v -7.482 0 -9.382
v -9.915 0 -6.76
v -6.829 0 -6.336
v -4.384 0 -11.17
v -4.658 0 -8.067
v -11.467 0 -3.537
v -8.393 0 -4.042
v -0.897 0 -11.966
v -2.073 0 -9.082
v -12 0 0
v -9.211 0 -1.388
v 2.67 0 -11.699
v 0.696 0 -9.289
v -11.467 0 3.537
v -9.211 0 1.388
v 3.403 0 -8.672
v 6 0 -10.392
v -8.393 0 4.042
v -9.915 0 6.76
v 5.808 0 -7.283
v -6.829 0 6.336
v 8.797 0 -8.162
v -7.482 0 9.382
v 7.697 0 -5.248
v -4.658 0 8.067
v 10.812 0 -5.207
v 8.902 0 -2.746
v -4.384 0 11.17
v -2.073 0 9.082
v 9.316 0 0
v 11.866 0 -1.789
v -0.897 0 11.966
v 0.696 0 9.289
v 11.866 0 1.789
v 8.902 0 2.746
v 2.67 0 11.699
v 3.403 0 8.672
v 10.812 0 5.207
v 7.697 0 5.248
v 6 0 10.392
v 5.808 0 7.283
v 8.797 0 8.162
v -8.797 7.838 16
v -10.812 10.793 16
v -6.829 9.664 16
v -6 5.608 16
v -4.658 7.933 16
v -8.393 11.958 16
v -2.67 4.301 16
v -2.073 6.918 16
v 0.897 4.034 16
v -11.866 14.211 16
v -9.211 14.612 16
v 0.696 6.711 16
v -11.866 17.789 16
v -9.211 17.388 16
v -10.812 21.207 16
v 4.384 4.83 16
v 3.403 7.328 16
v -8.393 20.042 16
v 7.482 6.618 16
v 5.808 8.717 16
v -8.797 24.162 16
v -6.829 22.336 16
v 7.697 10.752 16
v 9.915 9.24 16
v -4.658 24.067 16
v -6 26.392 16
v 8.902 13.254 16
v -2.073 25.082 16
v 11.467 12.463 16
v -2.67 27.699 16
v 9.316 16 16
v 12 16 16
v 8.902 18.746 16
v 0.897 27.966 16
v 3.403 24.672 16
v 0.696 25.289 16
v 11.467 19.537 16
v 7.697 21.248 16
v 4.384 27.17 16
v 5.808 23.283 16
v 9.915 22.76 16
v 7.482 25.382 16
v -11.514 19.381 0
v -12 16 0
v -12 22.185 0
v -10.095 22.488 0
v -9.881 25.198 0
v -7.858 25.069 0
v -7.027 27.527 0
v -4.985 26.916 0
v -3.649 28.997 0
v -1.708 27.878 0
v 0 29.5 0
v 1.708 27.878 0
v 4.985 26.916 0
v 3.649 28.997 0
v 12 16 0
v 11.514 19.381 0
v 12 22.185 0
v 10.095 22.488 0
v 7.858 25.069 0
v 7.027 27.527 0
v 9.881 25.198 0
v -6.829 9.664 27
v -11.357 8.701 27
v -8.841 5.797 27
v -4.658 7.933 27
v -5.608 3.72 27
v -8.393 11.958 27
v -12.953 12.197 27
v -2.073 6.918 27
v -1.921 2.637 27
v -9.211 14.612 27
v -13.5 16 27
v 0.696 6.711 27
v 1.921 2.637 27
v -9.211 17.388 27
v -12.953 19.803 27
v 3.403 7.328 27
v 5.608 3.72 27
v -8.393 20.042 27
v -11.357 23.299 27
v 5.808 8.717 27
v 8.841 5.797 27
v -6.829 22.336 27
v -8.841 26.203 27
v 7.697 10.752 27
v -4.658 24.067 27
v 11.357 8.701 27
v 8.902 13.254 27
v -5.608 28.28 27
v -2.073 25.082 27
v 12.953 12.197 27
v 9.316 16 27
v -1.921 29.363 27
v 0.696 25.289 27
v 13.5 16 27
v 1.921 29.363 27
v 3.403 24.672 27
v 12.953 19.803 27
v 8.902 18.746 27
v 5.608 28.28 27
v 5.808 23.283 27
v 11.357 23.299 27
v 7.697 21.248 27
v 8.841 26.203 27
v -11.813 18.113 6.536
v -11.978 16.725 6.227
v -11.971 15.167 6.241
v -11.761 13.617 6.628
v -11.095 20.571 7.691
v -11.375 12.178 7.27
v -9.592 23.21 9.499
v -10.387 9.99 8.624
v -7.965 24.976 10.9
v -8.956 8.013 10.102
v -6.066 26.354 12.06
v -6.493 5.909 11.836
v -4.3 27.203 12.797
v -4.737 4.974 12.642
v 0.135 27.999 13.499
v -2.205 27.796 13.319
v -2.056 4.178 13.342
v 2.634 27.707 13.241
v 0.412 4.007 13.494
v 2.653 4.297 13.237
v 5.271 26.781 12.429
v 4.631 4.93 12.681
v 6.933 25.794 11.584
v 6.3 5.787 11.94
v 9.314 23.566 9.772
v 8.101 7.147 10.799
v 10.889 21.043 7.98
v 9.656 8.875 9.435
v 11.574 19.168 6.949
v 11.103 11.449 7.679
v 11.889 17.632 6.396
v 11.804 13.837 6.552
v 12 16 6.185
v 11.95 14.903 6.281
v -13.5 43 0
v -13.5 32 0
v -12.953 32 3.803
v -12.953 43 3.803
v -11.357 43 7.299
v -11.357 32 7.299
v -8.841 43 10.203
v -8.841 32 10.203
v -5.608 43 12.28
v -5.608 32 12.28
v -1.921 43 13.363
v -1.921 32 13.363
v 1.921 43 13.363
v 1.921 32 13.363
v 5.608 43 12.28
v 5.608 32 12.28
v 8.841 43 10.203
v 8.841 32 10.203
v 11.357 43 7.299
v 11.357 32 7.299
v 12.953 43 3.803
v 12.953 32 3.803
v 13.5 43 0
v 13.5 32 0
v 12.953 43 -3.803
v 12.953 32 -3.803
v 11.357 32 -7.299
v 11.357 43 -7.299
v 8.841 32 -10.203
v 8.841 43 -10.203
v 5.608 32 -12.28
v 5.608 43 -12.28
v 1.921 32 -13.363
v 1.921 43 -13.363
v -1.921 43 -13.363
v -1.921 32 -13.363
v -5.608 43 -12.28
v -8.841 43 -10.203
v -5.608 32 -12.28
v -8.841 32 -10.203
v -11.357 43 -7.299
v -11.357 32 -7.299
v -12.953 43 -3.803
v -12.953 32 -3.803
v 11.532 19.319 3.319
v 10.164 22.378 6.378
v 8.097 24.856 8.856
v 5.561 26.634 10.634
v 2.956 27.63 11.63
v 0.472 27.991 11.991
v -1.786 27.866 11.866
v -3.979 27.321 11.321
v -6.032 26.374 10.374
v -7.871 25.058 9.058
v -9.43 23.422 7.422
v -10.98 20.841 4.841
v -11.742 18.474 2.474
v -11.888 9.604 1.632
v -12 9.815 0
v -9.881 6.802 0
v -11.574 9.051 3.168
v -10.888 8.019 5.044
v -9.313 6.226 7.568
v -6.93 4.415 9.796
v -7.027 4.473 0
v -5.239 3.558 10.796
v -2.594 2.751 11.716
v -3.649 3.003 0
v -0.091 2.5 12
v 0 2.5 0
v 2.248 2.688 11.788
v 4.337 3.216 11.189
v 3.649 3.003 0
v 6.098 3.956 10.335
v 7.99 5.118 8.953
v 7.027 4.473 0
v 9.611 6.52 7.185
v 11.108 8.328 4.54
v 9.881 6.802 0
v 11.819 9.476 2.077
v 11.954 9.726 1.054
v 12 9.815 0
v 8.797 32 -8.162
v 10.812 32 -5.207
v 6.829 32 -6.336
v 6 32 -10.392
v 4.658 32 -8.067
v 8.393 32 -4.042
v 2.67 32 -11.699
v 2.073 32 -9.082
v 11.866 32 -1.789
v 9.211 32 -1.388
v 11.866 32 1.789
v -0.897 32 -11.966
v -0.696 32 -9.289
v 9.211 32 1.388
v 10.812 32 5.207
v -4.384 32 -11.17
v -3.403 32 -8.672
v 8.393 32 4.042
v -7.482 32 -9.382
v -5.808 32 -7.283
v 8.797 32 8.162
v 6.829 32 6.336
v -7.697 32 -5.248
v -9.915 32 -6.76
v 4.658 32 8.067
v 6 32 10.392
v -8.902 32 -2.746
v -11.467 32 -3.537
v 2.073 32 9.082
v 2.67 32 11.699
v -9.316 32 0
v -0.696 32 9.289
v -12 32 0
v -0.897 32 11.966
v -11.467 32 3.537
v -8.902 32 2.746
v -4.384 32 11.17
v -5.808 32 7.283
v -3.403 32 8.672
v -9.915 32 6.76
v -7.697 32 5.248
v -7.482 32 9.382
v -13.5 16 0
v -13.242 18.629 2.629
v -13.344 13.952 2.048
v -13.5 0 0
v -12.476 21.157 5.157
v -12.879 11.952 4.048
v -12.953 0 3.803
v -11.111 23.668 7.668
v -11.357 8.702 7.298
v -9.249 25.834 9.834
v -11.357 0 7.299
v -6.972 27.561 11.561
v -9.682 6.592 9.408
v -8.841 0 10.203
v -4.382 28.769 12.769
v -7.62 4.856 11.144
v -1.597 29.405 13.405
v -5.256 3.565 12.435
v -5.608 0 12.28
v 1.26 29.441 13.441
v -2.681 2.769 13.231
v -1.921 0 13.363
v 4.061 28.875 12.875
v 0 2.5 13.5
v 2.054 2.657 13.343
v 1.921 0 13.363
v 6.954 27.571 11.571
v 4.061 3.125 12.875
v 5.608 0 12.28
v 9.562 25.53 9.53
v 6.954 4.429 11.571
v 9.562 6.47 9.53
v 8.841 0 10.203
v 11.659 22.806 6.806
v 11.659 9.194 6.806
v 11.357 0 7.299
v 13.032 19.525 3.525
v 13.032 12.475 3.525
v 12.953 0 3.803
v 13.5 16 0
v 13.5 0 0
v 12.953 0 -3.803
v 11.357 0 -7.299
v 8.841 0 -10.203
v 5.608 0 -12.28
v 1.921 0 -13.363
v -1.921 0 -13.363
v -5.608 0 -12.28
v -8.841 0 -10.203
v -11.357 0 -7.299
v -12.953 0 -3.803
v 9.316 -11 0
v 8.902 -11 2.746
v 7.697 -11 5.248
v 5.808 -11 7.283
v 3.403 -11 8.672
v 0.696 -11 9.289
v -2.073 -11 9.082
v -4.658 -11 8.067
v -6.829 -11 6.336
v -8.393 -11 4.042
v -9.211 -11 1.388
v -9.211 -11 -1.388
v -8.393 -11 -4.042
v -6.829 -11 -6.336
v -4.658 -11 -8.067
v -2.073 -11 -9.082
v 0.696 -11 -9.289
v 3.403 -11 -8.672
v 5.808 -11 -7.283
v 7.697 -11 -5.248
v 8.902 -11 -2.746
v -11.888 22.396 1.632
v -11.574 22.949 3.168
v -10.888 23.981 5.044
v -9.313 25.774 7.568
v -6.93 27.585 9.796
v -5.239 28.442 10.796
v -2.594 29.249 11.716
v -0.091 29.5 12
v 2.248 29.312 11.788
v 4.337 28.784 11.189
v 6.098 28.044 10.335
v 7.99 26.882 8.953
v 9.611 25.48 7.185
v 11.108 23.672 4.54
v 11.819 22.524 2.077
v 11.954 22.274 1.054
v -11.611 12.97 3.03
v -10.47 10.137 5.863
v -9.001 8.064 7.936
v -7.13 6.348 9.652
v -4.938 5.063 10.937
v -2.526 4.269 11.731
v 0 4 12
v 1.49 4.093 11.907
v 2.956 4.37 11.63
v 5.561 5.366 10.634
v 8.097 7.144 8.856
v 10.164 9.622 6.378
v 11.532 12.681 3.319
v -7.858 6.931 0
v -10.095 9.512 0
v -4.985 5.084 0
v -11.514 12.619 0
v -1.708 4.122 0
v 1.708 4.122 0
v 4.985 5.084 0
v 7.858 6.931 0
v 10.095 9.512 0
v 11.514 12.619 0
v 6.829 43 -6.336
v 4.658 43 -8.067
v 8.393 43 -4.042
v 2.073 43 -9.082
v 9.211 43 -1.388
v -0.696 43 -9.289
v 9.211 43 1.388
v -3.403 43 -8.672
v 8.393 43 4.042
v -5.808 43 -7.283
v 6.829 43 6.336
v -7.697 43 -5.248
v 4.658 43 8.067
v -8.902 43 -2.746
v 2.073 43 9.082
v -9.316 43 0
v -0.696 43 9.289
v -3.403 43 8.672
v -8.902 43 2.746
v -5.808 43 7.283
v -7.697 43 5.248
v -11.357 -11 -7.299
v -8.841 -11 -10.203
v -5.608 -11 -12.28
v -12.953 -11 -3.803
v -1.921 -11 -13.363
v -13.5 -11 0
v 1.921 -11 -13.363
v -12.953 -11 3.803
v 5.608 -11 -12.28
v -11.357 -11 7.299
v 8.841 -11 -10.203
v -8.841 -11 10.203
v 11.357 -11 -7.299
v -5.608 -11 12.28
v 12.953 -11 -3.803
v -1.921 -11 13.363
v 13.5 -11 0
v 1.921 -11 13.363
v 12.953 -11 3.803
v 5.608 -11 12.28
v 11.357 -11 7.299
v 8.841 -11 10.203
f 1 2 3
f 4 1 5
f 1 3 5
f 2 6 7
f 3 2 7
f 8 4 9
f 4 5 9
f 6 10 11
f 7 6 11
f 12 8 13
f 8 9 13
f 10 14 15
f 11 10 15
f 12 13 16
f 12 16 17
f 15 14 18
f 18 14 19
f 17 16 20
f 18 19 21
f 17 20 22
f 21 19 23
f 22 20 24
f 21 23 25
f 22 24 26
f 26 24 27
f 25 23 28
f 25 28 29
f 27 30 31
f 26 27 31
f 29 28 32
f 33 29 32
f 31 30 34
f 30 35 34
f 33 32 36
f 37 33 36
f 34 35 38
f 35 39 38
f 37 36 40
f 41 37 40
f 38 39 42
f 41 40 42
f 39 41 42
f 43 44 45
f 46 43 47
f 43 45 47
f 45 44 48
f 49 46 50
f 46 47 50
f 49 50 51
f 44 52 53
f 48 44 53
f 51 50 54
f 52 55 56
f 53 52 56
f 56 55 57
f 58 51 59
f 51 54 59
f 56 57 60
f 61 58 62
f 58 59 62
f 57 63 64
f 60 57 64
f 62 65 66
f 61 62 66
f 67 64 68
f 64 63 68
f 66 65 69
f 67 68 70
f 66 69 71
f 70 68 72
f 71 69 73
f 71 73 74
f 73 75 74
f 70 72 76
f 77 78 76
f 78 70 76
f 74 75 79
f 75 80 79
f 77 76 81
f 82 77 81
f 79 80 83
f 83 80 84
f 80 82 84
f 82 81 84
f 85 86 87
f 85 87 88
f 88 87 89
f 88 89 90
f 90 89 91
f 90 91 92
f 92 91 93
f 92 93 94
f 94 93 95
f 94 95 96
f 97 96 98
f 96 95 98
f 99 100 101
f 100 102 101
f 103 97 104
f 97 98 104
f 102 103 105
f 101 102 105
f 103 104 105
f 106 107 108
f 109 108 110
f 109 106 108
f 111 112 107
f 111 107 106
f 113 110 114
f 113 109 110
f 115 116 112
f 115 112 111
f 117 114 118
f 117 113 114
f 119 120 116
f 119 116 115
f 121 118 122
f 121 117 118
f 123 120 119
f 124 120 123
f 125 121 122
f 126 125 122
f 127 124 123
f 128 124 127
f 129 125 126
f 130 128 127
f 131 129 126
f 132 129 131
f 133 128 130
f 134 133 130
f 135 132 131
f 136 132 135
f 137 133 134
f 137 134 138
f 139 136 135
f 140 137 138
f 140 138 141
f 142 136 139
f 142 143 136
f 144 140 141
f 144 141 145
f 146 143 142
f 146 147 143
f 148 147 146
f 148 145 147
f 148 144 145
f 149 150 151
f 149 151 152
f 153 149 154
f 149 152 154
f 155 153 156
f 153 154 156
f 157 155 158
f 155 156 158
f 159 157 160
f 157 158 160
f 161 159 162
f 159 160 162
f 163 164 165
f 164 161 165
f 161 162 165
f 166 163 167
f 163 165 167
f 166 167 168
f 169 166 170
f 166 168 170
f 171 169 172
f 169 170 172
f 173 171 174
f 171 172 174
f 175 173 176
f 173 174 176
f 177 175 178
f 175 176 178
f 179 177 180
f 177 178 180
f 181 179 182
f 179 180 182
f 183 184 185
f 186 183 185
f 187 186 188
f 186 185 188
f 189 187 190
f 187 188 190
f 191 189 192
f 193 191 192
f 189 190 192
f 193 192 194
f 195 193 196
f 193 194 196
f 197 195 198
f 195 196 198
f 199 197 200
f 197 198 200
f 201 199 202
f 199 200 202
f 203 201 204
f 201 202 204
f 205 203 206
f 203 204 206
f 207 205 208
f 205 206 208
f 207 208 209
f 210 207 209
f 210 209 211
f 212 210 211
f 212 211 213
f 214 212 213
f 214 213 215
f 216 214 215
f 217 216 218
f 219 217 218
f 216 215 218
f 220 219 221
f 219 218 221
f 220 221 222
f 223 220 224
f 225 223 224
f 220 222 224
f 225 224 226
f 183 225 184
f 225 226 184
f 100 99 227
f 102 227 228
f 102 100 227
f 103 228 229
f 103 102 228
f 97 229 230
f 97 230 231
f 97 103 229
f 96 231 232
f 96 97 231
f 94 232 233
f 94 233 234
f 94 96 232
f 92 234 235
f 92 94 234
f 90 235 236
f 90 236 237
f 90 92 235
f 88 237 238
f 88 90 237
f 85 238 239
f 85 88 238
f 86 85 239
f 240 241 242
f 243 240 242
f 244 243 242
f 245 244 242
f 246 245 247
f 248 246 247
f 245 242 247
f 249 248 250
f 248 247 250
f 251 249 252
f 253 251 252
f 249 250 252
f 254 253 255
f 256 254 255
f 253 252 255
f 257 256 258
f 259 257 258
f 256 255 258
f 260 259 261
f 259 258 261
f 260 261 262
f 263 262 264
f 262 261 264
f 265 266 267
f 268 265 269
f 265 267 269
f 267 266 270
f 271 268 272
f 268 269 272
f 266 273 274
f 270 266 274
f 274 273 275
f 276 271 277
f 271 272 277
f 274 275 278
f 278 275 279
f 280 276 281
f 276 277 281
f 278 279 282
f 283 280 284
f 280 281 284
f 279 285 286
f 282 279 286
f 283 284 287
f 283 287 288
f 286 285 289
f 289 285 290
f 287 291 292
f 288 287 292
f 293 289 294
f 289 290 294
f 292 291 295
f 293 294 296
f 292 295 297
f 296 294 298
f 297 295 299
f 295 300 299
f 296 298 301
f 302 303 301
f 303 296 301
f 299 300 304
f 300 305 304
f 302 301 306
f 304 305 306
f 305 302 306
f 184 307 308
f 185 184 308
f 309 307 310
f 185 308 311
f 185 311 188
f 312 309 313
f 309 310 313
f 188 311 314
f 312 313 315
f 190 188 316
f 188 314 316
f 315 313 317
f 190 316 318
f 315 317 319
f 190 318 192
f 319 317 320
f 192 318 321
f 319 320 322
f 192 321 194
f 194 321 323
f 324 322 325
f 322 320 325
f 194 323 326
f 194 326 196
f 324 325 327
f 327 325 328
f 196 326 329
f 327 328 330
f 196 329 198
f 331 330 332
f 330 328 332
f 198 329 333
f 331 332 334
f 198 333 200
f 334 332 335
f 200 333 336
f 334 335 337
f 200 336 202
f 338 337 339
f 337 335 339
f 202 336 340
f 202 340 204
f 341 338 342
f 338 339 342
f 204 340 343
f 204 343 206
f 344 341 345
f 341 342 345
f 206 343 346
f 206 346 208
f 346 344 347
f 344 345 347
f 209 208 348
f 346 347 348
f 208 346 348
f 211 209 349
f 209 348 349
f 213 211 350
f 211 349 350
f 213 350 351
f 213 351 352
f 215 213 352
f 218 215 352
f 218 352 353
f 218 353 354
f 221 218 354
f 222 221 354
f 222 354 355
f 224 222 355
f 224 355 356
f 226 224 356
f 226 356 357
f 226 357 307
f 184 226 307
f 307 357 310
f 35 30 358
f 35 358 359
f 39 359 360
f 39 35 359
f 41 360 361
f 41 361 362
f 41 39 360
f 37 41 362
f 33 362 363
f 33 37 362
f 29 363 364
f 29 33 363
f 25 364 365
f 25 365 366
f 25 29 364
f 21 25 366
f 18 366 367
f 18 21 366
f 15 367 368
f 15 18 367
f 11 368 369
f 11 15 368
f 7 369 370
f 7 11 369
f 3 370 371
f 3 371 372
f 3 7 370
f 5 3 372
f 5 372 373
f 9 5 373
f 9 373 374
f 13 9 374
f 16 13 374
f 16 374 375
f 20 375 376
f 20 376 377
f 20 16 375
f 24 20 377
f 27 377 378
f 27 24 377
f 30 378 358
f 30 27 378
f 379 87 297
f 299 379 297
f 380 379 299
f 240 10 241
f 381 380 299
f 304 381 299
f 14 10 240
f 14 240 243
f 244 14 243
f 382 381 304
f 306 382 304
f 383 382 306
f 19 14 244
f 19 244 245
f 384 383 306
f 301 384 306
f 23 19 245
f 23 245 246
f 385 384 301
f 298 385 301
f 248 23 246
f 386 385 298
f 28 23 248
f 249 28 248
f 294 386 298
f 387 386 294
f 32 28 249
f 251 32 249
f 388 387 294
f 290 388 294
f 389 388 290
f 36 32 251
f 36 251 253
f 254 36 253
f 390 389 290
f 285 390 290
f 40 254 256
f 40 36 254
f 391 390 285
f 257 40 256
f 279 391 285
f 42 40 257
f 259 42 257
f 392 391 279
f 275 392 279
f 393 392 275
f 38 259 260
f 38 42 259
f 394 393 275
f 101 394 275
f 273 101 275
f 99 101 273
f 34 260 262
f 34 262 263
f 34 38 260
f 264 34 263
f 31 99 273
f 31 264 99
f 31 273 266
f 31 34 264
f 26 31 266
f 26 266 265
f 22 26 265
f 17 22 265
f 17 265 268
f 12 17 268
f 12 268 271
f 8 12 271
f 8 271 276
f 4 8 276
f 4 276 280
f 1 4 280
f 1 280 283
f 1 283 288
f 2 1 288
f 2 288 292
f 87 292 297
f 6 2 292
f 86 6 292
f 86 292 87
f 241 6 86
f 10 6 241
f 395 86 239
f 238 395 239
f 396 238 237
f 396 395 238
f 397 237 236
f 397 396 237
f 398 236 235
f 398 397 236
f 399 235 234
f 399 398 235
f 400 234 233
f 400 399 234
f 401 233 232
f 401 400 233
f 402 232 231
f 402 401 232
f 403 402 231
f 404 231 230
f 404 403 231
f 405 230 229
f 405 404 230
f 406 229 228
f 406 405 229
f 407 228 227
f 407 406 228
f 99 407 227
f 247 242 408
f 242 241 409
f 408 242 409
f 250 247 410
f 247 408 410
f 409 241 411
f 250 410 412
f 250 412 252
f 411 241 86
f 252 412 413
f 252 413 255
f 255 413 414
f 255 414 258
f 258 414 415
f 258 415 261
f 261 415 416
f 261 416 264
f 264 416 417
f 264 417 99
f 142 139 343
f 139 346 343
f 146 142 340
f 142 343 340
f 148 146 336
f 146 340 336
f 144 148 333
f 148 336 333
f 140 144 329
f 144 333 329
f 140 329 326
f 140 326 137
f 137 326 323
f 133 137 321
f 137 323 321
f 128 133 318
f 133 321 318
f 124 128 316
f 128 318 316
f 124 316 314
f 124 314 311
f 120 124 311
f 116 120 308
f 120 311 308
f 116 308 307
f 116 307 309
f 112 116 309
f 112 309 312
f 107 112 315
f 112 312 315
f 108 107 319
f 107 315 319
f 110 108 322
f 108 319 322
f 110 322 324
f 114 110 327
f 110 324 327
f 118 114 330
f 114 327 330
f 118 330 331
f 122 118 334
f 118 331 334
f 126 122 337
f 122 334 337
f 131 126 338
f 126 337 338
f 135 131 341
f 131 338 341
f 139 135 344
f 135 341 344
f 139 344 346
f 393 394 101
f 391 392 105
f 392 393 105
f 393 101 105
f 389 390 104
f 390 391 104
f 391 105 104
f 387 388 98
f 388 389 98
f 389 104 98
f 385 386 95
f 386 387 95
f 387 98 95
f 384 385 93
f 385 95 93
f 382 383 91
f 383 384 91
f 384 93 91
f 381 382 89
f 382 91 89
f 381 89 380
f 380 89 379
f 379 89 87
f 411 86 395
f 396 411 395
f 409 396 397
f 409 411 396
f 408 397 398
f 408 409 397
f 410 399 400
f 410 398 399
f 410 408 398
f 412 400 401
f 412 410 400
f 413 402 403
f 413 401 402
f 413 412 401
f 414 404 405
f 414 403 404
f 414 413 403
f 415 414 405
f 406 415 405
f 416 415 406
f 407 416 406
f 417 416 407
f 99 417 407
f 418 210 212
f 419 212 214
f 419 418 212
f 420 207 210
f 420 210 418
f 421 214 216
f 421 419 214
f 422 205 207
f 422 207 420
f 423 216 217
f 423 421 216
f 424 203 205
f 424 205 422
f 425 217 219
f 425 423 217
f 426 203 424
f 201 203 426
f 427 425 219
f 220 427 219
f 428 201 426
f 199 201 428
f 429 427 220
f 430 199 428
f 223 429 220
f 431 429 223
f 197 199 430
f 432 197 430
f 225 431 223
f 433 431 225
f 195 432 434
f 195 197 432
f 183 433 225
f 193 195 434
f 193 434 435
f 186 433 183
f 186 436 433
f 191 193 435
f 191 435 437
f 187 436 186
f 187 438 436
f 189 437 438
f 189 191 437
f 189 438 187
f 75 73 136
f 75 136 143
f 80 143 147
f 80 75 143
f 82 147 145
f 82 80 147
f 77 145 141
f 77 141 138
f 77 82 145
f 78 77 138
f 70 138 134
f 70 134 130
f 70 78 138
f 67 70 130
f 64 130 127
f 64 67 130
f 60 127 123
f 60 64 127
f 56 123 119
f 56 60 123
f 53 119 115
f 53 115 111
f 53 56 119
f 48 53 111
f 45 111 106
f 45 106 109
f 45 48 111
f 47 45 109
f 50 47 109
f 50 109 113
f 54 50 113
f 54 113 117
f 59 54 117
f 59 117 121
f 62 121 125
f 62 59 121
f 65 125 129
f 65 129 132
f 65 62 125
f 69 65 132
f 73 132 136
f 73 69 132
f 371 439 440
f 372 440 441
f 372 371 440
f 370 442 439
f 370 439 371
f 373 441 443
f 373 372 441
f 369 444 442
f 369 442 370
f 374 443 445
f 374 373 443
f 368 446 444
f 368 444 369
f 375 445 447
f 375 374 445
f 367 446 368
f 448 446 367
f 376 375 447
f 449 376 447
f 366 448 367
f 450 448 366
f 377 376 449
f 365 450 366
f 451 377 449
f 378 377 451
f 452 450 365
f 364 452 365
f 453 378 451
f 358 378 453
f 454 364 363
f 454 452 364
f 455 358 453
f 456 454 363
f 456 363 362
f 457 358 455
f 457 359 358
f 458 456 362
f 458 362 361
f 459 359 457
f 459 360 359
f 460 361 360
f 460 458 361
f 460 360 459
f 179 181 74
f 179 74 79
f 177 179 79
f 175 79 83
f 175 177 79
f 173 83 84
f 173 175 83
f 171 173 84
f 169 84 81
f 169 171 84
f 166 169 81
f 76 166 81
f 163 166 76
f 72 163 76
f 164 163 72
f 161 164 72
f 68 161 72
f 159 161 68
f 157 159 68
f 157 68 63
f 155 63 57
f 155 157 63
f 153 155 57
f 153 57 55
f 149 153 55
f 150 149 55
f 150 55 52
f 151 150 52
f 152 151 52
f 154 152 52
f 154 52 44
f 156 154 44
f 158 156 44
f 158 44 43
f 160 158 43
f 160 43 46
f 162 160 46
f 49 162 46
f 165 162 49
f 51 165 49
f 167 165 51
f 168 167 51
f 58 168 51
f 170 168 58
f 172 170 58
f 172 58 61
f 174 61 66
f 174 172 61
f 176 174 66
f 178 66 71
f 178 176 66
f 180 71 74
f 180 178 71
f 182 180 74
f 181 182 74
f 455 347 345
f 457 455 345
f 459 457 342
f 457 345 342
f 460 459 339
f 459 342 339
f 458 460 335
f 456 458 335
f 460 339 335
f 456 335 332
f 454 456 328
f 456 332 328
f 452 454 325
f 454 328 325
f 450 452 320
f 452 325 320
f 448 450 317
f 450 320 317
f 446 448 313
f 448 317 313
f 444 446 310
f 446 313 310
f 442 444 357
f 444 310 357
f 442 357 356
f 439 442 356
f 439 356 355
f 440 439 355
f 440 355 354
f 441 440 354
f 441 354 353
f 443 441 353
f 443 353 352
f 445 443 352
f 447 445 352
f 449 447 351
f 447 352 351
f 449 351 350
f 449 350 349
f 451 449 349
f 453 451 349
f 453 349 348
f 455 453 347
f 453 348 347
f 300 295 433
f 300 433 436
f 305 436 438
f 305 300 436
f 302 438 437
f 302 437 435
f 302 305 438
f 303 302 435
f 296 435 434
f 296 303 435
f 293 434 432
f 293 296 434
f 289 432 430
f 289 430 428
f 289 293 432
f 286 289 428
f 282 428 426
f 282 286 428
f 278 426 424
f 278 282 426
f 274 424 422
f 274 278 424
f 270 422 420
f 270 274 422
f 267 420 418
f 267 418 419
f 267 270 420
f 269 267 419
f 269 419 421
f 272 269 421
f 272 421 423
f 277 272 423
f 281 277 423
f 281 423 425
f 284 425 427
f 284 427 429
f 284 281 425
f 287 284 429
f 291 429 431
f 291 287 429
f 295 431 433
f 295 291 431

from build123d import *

# Parameters (mm, degrees)
F0_R     = 13.5
F0_R_2   = 9.3155
F1_DEPTH = 11
F2_R     = 13.5
F2_R_2   = 12
F3_DEPTH = 32
F4_R     = 13.5
F4_R_2   = 9.3155
F5_DEPTH = 11
F6_R     = 13.5
F6_R_2   = 12
F7_DEPTH = 16
F8_R     = 13.5
F8_R_2   = 9.3155
F9_DEPTH = 11


with BuildPart() as f1:
    # F0 (on Front) → F1 (new body)
    with BuildSketch(Plane.XZ):
        Circle(F0_R)
        Circle(F0_R_2, mode=Mode.SUBTRACT)
    extrude(amount=F1_DEPTH)

    # F2 (on face) → F3 (join)
    with BuildSketch(Plane(origin=(0, 0, 0), x_dir=(-1, 0, 0), z_dir=(0, 1, 0))):
        Circle(F2_R)
        Circle(F2_R_2, mode=Mode.SUBTRACT)
    extrude(amount=F3_DEPTH)

    # F4 (on face) → F5 (join)
    with BuildSketch(Plane(origin=(0, 32, 0), x_dir=(-1, 0, 0), z_dir=(0, 1, 0))):
        Circle(F4_R)
        Circle(F4_R_2, mode=Mode.SUBTRACT)
    extrude(amount=F5_DEPTH)

    # F6 (on Top) → F7 (join)
    with BuildSketch(Plane.XY):
        with Locations((0, 16)):
            Circle(F6_R)
        with Locations((0, 16)):
            Circle(F6_R_2, mode=Mode.SUBTRACT)
    extrude(amount=F7_DEPTH)

    # F8 (on face) → F9 (join)
    with BuildSketch(Plane.XY.offset(16)):
        with Locations((0, 16)):
            Circle(F8_R)
        with Locations((0, 16)):
            Circle(F8_R_2, mode=Mode.SUBTRACT)
    extrude(amount=F9_DEPTH)


solid = f1.part
